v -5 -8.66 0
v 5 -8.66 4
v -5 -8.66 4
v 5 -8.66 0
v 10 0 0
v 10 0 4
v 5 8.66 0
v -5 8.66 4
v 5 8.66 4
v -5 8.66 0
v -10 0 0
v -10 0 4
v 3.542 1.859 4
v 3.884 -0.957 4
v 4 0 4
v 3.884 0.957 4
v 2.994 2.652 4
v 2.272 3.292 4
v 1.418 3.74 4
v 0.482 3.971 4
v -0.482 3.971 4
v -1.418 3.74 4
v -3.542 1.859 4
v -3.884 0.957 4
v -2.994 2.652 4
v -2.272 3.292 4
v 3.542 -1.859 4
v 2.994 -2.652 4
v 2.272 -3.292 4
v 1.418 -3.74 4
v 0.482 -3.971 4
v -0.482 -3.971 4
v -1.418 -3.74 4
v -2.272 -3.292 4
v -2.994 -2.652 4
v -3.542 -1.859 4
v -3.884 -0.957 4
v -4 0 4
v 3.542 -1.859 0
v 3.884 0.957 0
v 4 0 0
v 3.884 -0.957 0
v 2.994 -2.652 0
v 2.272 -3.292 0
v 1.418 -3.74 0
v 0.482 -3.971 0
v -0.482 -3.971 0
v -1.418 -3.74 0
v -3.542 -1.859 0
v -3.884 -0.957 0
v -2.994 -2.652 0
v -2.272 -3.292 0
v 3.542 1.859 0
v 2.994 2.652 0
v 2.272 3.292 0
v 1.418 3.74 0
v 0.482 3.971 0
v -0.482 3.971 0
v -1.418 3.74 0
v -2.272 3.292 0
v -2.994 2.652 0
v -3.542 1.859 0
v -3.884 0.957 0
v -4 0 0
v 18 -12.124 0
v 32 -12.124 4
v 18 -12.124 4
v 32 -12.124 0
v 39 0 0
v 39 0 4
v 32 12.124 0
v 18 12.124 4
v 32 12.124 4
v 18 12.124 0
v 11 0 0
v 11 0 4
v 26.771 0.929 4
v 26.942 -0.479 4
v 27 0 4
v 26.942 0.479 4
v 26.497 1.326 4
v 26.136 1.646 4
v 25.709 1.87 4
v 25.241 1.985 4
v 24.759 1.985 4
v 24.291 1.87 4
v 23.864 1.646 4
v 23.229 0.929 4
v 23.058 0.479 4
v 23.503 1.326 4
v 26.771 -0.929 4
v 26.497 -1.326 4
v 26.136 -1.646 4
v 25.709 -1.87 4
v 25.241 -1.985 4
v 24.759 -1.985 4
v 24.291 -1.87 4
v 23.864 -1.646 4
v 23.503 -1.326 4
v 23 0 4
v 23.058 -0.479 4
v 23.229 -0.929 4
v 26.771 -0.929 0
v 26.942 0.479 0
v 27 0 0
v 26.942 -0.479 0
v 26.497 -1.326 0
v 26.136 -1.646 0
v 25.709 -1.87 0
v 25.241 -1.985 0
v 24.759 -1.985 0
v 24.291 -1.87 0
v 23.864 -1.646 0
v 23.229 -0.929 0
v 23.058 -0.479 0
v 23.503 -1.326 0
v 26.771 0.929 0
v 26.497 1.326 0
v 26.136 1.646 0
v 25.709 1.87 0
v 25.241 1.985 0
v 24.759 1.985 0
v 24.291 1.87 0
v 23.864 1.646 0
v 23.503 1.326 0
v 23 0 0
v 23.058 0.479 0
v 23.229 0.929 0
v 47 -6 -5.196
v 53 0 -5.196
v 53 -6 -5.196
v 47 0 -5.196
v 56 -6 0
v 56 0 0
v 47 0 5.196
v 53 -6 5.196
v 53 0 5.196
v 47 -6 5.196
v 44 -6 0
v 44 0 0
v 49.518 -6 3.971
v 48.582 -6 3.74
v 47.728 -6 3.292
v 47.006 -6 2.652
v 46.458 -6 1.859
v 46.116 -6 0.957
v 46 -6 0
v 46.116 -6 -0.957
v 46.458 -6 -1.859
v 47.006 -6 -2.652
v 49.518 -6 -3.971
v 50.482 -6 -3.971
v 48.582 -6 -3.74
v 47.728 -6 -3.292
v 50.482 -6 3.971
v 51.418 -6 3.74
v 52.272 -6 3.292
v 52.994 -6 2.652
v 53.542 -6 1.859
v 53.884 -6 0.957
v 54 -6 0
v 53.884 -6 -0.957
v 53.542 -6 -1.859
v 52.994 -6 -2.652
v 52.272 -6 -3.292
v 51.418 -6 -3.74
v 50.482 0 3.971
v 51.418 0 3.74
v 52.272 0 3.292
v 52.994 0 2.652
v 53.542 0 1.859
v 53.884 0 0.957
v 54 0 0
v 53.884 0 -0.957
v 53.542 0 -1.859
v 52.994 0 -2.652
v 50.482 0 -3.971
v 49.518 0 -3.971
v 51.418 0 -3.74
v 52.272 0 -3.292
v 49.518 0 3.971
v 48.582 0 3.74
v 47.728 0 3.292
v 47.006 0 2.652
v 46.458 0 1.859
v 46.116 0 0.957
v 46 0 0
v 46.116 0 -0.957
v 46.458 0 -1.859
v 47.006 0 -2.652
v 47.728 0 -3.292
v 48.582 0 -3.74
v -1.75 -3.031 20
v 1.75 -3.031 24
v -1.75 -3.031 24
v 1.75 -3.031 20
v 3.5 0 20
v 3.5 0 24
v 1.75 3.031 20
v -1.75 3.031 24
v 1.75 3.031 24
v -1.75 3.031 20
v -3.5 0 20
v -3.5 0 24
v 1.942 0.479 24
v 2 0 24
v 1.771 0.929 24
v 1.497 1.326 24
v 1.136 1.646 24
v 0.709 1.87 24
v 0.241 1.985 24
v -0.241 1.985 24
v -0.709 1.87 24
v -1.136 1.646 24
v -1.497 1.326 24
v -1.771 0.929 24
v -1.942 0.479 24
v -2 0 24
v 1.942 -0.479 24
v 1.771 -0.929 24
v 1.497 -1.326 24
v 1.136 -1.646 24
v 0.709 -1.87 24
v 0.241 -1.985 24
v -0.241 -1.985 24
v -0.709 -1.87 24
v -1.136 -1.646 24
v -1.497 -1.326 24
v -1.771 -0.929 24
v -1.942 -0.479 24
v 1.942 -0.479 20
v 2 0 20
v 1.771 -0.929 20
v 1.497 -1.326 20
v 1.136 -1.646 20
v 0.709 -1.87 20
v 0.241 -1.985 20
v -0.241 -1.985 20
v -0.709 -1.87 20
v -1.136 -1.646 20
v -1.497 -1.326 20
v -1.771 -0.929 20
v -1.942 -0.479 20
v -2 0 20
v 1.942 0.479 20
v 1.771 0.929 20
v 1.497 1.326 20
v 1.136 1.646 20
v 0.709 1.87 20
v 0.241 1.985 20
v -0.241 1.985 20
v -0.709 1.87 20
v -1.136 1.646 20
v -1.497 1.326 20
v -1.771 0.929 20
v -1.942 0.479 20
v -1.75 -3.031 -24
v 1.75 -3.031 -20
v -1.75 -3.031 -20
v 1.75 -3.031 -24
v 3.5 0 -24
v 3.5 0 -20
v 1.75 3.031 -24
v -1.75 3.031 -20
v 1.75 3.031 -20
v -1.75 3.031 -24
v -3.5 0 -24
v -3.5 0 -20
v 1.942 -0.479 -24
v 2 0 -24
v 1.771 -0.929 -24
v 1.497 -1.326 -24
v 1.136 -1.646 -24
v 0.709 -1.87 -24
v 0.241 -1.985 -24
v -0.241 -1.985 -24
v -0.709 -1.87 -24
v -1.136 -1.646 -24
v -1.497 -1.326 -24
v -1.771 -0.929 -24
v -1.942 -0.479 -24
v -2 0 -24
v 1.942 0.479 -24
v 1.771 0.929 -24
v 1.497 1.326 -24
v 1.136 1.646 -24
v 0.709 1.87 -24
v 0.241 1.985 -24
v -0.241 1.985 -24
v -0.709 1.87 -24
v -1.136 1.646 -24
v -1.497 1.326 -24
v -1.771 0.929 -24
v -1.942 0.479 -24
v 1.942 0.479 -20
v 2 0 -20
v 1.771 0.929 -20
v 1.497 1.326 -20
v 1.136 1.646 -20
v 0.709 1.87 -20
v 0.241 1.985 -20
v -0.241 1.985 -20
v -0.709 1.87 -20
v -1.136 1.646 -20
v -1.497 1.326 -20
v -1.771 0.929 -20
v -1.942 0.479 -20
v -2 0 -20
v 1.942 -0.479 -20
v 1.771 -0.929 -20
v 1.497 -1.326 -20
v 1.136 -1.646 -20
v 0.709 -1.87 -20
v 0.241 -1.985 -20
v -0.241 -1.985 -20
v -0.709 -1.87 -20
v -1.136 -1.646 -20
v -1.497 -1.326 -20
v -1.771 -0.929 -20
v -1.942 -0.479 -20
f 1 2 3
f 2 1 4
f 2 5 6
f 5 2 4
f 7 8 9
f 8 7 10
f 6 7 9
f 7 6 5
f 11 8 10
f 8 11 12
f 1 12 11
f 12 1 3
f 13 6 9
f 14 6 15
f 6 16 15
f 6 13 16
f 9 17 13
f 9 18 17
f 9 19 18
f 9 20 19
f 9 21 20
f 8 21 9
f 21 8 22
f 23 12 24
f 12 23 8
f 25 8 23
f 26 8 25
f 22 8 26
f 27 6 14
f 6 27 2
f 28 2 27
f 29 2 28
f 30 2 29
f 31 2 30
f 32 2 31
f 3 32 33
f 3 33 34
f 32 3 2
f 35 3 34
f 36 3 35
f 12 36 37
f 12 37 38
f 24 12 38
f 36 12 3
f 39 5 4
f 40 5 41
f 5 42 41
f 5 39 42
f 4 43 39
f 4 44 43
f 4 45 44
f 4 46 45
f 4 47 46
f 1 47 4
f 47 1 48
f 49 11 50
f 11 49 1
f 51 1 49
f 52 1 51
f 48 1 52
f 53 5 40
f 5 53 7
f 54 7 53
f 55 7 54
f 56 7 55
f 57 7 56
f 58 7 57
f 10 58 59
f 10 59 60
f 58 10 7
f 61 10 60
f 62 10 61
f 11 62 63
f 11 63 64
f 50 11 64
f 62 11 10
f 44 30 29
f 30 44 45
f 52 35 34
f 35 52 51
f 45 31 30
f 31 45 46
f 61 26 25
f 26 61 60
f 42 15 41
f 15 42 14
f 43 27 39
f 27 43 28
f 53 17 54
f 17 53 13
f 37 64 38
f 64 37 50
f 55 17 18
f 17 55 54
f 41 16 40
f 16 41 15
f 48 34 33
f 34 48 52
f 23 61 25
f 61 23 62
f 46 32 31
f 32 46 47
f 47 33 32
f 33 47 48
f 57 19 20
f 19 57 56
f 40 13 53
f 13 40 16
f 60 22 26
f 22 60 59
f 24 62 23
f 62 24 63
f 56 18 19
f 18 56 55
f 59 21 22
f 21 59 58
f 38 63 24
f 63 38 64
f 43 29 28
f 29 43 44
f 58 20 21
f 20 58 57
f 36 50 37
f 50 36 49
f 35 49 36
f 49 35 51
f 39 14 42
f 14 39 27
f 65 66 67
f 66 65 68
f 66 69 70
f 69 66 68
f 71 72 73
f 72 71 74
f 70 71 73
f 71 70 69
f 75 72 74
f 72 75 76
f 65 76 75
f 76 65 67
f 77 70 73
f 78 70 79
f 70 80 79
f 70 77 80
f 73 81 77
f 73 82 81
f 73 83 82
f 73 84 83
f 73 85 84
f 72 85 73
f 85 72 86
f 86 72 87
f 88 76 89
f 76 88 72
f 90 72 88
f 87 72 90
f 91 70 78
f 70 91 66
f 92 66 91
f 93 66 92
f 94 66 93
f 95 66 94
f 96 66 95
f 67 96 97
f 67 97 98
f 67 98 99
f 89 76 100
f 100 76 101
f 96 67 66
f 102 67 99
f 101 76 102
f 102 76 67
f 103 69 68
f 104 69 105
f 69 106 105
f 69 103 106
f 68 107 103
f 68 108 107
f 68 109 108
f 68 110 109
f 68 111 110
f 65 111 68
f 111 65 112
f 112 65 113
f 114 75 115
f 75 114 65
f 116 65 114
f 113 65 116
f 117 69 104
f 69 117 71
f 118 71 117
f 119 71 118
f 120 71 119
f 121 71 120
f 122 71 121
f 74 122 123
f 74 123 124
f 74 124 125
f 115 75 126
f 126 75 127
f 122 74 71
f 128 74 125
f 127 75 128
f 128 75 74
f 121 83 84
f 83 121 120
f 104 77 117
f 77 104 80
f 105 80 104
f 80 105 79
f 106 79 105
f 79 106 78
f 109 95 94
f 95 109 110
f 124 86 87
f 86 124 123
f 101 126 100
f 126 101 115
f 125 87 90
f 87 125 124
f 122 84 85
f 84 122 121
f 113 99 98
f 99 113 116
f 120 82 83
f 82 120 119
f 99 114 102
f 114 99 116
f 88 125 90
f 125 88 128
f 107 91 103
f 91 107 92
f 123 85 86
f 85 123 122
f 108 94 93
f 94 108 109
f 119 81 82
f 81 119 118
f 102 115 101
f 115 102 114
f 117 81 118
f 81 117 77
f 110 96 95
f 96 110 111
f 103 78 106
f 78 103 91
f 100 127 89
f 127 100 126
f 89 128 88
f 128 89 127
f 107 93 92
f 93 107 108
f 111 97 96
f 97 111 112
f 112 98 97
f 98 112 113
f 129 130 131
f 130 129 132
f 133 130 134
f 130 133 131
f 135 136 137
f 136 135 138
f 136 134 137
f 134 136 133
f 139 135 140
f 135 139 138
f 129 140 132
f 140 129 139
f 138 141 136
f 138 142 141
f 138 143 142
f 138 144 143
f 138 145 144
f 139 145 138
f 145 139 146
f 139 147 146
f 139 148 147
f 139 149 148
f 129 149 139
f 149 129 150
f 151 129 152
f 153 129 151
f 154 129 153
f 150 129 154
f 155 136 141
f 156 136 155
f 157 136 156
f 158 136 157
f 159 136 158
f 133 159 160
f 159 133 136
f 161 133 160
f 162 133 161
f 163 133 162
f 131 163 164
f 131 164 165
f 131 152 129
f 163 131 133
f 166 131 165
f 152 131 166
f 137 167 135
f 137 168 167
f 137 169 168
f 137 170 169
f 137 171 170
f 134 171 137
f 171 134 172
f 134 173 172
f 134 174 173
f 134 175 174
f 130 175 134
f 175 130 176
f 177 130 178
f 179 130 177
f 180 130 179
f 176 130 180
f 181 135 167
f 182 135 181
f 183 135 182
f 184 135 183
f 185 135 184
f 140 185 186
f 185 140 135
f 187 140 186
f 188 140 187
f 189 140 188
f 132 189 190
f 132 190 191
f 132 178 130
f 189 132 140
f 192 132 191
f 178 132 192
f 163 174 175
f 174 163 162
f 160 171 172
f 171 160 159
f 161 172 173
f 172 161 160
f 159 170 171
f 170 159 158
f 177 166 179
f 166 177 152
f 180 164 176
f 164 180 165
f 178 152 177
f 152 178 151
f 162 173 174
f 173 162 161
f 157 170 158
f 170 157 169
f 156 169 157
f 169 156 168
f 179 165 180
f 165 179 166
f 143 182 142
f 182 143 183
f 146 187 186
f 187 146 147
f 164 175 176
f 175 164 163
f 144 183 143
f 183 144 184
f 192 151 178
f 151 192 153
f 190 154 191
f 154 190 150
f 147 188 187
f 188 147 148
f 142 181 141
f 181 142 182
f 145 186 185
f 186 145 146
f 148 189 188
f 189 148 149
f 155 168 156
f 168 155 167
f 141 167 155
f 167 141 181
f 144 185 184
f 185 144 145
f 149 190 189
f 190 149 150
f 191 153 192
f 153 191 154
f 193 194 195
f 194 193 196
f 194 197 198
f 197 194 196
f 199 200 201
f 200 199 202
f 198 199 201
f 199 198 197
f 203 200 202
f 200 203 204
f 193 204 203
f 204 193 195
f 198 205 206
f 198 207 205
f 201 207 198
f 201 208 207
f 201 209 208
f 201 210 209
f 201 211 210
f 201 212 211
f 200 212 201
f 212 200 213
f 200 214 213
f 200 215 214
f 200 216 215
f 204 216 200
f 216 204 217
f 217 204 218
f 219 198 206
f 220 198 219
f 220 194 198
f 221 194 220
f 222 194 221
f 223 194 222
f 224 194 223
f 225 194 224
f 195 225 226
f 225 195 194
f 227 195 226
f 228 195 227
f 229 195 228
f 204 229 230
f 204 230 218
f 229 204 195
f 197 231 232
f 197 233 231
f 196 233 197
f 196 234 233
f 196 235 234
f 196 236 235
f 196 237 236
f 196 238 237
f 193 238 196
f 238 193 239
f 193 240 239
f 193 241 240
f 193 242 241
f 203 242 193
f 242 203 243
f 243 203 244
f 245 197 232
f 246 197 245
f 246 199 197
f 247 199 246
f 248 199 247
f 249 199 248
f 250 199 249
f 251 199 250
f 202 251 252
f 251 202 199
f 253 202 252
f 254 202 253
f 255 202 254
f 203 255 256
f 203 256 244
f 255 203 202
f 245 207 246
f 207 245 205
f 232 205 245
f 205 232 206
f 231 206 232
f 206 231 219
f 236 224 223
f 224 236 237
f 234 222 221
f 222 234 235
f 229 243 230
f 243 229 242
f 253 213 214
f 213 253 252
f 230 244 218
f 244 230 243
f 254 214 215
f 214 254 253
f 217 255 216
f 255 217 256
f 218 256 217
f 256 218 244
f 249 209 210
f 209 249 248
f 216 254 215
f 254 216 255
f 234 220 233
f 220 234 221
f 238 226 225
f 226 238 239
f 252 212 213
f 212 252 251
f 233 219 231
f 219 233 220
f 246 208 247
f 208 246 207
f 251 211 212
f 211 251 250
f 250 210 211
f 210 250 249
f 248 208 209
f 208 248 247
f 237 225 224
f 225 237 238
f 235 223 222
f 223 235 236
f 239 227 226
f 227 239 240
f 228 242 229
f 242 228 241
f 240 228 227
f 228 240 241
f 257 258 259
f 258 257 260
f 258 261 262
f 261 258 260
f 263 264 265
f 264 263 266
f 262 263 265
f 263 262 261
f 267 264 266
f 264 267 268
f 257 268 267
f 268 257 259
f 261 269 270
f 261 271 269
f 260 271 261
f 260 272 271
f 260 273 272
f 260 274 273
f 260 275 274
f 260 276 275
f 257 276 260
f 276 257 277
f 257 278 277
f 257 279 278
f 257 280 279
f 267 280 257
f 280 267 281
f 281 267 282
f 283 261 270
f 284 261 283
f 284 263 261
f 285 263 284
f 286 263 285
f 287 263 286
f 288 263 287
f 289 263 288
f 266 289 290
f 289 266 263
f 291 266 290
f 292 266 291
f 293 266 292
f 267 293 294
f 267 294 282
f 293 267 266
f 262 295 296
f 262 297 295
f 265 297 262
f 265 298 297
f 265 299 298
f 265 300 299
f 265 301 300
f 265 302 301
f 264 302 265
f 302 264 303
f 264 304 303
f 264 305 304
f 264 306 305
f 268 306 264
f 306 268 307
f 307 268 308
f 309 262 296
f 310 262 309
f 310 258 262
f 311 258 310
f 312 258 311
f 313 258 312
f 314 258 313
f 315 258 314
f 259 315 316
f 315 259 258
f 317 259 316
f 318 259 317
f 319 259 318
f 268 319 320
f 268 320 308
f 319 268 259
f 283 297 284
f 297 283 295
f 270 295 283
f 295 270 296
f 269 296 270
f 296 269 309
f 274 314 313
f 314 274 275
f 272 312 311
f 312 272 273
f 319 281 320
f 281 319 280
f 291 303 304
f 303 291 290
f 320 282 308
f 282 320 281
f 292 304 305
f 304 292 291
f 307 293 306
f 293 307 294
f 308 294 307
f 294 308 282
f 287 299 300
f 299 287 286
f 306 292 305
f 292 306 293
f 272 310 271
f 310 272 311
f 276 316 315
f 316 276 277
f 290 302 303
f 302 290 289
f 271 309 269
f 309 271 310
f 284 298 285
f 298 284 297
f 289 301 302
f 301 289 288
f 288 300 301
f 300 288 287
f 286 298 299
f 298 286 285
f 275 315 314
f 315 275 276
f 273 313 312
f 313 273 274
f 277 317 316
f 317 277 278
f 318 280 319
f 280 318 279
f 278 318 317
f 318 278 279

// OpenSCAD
module piulita(raza_exterior, raza_interior, grosime)
{
    difference(){
        cylinder(h = grosime, r = raza_exterior, $fn = 6);
    
        translate ([0, 0, -1]) cylinder(h = grosime + 2, r = raza_interior, $fn = 26);
    }
}
//-----------------------
module piulita_M4()
{
 piulita(3.5, 2, 4);
    
}


color ("red") piulita(10, 4, 4);
color ("yellow") translate ([25, 0, 0]) piulita(14, 2, 4);

color("blue") translate ([50, 0, 0]) rotate([90, 0, 0]) piulita(6, 4, 6);
translate([0, 0, 20]) piulita_M4();
mirror([0, 0, 1]) translate([0, 0, 20]) piulita_M4();
